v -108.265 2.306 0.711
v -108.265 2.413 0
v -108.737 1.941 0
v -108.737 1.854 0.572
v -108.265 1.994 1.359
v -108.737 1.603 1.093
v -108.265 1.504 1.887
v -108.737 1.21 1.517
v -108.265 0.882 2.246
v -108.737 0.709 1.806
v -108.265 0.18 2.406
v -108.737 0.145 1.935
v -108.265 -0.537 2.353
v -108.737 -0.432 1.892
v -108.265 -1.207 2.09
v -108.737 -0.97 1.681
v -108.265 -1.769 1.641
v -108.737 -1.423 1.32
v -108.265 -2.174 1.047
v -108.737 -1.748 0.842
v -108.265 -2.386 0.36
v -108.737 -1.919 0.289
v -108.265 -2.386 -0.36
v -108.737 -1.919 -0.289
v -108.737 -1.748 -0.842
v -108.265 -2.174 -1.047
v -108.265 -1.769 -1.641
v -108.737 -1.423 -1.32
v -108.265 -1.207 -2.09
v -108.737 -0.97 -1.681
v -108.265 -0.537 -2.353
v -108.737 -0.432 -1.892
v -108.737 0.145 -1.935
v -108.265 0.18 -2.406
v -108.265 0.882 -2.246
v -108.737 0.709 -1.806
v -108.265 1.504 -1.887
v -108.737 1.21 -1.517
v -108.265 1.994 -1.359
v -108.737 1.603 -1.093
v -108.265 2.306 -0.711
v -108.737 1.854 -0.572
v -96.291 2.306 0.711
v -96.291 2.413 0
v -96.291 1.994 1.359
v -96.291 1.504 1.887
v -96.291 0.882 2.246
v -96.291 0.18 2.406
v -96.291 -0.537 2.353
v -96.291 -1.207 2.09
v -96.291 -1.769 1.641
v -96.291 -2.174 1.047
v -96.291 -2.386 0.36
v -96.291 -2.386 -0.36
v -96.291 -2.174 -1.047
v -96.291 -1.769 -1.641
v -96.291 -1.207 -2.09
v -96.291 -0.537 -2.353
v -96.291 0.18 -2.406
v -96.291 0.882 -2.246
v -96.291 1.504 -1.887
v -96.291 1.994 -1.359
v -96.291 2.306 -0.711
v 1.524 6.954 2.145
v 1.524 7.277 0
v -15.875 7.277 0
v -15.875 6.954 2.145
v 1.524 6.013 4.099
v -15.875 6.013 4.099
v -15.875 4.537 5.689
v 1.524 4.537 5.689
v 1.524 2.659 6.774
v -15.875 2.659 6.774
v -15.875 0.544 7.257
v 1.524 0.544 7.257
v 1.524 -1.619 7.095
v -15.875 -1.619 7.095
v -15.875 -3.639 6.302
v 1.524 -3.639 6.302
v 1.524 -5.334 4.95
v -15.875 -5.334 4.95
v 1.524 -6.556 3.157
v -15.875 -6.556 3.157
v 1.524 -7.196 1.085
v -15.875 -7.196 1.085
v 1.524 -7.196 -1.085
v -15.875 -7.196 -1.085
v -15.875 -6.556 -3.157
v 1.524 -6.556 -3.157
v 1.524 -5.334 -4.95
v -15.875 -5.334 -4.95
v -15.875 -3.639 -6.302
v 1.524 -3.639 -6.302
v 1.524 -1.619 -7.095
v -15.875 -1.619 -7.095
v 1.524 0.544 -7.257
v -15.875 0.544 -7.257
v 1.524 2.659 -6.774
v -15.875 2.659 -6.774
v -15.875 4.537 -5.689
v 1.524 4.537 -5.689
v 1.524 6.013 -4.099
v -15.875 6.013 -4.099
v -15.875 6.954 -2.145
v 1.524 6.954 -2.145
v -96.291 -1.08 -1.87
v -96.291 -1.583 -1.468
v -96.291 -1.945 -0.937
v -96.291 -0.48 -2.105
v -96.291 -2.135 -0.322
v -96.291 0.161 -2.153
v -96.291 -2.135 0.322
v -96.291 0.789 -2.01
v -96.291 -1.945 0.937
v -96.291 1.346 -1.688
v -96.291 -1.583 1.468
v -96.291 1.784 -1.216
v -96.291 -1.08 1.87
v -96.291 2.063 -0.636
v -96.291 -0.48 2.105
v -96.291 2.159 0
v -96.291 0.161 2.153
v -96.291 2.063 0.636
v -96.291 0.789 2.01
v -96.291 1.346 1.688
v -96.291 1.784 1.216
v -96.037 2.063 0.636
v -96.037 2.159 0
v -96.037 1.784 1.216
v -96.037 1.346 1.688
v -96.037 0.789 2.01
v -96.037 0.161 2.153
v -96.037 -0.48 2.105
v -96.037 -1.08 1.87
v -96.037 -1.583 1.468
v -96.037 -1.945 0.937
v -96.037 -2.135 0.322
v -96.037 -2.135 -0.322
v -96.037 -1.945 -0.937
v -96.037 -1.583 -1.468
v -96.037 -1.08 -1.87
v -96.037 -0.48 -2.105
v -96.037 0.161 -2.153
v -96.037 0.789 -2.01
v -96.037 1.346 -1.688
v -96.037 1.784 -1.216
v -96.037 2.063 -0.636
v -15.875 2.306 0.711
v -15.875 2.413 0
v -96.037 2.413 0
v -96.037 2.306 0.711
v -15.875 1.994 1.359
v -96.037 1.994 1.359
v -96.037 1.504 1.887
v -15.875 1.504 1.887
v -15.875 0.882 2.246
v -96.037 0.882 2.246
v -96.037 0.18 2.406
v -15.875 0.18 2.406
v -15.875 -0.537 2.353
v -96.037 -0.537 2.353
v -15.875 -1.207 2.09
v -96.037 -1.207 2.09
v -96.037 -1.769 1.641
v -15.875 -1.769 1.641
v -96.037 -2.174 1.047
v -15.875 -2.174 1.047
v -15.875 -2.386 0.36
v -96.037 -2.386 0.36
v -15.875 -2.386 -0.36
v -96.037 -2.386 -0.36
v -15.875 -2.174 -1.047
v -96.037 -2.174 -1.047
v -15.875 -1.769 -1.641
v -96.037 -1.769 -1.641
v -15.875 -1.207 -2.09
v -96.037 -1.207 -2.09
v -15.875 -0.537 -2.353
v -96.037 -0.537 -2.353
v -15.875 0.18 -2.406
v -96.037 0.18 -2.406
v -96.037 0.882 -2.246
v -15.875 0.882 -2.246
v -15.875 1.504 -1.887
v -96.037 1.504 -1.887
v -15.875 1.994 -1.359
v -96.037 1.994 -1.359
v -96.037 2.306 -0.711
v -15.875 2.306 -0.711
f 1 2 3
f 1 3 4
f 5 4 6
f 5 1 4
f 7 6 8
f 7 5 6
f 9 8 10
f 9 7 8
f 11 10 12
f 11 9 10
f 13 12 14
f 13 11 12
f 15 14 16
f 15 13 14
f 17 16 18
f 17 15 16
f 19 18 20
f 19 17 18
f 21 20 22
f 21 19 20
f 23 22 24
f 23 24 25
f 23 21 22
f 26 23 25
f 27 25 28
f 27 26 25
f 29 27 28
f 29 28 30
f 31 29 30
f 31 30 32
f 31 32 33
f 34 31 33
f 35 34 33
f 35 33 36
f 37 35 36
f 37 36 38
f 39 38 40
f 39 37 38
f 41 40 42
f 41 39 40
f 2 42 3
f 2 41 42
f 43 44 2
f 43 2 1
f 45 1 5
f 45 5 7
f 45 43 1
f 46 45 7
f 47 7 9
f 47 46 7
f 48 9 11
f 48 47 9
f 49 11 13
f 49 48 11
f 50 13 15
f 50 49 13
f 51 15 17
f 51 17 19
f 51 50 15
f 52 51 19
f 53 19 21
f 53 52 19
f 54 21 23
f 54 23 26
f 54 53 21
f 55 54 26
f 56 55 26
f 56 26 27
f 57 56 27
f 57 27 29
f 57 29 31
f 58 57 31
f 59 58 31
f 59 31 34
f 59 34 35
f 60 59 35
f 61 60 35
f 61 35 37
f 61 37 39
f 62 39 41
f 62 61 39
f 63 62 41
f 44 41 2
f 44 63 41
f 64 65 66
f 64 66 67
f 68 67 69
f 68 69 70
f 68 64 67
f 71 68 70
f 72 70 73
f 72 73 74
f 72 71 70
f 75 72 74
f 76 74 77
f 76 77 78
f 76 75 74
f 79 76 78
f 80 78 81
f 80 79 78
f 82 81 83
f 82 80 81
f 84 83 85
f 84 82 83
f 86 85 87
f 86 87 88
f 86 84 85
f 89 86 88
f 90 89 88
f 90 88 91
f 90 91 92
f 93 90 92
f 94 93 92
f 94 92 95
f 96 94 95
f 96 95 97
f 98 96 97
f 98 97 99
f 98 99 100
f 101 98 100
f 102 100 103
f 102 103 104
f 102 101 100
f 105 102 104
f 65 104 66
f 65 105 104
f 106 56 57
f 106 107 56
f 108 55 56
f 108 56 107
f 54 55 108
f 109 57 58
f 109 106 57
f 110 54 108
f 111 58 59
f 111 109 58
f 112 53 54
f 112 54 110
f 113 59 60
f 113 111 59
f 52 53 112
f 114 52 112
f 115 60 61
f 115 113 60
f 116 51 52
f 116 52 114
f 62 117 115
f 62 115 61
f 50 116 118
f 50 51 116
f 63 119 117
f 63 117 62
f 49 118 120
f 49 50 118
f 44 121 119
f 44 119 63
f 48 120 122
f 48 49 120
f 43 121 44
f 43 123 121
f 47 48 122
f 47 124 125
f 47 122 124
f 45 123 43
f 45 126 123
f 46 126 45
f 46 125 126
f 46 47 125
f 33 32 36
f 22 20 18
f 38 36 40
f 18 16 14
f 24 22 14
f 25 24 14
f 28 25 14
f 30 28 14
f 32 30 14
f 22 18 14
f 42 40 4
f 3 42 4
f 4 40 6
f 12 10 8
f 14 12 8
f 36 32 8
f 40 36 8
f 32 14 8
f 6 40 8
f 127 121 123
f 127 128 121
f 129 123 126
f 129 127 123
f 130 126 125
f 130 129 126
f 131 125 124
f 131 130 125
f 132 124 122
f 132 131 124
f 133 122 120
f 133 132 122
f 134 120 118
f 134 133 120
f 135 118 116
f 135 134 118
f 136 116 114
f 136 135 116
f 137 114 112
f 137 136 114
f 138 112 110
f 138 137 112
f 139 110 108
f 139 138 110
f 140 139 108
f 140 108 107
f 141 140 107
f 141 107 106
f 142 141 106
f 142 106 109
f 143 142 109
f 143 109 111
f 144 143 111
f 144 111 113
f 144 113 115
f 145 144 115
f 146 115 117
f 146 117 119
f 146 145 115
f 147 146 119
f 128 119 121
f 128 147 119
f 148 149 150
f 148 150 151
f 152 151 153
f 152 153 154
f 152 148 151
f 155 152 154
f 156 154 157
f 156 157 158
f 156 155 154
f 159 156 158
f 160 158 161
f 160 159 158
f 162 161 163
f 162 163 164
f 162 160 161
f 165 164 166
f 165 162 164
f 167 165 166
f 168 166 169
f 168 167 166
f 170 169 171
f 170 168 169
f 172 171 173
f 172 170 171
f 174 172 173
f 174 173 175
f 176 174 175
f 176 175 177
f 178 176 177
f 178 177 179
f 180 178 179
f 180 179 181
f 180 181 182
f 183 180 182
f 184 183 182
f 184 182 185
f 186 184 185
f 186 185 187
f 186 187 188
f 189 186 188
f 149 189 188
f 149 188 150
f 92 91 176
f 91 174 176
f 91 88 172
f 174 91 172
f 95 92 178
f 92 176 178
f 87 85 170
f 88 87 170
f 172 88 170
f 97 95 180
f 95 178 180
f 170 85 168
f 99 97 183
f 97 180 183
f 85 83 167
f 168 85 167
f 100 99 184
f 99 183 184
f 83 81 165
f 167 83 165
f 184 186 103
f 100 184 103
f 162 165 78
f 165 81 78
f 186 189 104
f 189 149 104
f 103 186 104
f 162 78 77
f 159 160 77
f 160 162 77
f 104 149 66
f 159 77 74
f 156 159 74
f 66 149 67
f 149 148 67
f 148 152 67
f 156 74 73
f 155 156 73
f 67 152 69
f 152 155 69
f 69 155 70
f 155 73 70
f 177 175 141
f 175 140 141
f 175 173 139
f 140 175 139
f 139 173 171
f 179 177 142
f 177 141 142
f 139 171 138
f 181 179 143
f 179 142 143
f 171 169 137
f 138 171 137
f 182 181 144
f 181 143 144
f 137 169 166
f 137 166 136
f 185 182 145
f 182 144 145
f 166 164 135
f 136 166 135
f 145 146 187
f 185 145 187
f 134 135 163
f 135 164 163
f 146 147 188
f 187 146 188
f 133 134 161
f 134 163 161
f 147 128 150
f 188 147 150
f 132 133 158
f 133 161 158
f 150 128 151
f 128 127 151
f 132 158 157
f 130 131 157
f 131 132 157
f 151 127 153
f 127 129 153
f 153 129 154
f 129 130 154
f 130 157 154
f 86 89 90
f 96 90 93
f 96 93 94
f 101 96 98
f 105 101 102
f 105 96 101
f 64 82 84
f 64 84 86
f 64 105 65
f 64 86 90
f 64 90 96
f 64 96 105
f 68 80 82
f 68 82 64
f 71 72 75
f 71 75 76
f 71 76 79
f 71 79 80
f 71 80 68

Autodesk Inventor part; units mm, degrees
sketch "Sketch_3" plane through (0, 0, 0) normal (0, 0, 1) x (1, 0, 0)
  line L0 (0, 0) -> (-108.7374, 0)
  line L1 (-108.7374, 0) -> (-108.7374, 1.9406)
  line L2 (-108.7374, 1.9406) -> (-108.265, 2.413)
  line L3 (-108.265, 2.413) -> (0, 2.413)
  line L4 (0, 2.413) -> (0, 0)
  line L5 (0, 0) -> (-108.7374, 0)
revolve "Revolution1" add sketch "Sketch_3" angle 360 about axis through (0, 0, 0) along (1, 0, 0)
thread "Thread1" size "10-32 UNF" class "2A" standard "ANSI Unified Screw Threads" length 12.446 offset 96.2914
sketch "Sketch_17" plane through (0, 0, 0) normal (0, 0, 1) x (1, 0, 0)
  line L0 (108.7374, 0) -> (-108.7374, 0)
  line L1 (-96.2914, 2.413) -> (-96.2914, 2.159)
  line L2 (-96.2914, 2.159) -> (-96.0374, 2.159)
  line L3 (-96.0374, 2.159) -> (-96.0374, 2.413)
  line L4 (-96.0374, 2.413) -> (-96.2914, 2.413)
revolve "Revolution2" cut sketch "Sketch_17" angle 360 about axis through (108.7374, 0, 0) along (1, 0, 0)
sketch "Sketch_12" plane through (0, 0, 0) normal (0, 0, 1) x (1, 0, 0)
  line L0 (1.524, 0) -> (-15.875, 0)
  line L1 (-15.875, 0) -> (-15.875, 7.2771)
  line L2 (-15.875, 7.2771) -> (1.524, 7.2771)
  line L3 (1.524, 7.2771) -> (1.524, 0)
  line L4 (1.524, 0) -> (-15.875, 0)
revolve "Revolution3" add sketch "Sketch_12" angle 360 about axis through (1.524, 0, 0) along (1, 0, 0)
ref_plane "h1_XY" through (-108.7374, 0, 0) normal (0, 1, 0) x (1, 0, 0)
ref_plane "h1_YZ" through (-108.7374, 0, 0) normal (1, 0, 0) x (0, 0, -1)
ref_plane "h1_ZX" through (-108.7374, 0, 0) normal (0, 0, -1) x (0, 1, 0)
ref_plane "h2_XY" through (-96.0374, 0, 0) normal (0, 1, 0) x (1, 0, 0)
ref_plane "h2_YZ" through (-96.0374, 0, 0) normal (1, 0, 0) x (0, 0, -1)
ref_plane "h2_ZX" through (-96.0374, 0, 0) normal (0, 0, -1) x (0, 1, 0)
ref_plane "k1_XY" through (-108.7374, 0, -2.413) normal (0, 1, 0) x (1, 0, 0)
ref_plane "k1_YZ" through (-108.7374, 0, -2.413) normal (1, 0, 0) x (0, 0, -1)
ref_plane "k1_ZX" through (-108.7374, 0, -2.413) normal (0, 0, -1) x (0, 1, 0)
ref_plane "k2_XY" through (-108.7374, 0, 2.413) normal (0, 1, 0) x (1, 0, 0)
ref_plane "k2_YZ" through (-108.7374, 0, 2.413) normal (1, 0, 0) x (0, 0, -1)
ref_plane "k2_ZX" through (-108.7374, 0, 2.413) normal (0, 0, -1) x (0, 1, 0)
ref_plane "start_XY" through (-96.0374, 0, 0) normal (0, 1, 0) x (1, 0, 0)
ref_plane "start_YZ" through (-96.0374, 0, 0) normal (1, 0, 0) x (0, 0, -1)
ref_plane "start_ZX" through (-96.0374, 0, 0) normal (0, 0, -1) x (0, 1, 0)
ref_plane "to_prc_XY" through (-96.0374, 0, 0) normal (1, 0, 0) x (0, 0, -1)
ref_plane "to_prc_YZ" through (-96.0374, 0, 0) normal (0, 0, -1) x (0, 1, 0)
ref_plane "to_prc_ZX" through (-96.0374, 0, 0) normal (0, 1, 0) x (1, 0, 0)
ref_plane "to_rod_guide_XY" through (-108.7374, 0, 0) normal (1, 0, 0) x (0, 0, -1)
ref_plane "to_rod_guide_YZ" through (-108.7374, 0, 0) normal (0, 0, -1) x (0, 1, 0)
ref_plane "to_rod_guide_ZX" through (-108.7374, 0, 0) normal (0, 1, 0) x (1, 0, 0)
properties part number "D-75080.5-1.5XP-4.281-3pos"
